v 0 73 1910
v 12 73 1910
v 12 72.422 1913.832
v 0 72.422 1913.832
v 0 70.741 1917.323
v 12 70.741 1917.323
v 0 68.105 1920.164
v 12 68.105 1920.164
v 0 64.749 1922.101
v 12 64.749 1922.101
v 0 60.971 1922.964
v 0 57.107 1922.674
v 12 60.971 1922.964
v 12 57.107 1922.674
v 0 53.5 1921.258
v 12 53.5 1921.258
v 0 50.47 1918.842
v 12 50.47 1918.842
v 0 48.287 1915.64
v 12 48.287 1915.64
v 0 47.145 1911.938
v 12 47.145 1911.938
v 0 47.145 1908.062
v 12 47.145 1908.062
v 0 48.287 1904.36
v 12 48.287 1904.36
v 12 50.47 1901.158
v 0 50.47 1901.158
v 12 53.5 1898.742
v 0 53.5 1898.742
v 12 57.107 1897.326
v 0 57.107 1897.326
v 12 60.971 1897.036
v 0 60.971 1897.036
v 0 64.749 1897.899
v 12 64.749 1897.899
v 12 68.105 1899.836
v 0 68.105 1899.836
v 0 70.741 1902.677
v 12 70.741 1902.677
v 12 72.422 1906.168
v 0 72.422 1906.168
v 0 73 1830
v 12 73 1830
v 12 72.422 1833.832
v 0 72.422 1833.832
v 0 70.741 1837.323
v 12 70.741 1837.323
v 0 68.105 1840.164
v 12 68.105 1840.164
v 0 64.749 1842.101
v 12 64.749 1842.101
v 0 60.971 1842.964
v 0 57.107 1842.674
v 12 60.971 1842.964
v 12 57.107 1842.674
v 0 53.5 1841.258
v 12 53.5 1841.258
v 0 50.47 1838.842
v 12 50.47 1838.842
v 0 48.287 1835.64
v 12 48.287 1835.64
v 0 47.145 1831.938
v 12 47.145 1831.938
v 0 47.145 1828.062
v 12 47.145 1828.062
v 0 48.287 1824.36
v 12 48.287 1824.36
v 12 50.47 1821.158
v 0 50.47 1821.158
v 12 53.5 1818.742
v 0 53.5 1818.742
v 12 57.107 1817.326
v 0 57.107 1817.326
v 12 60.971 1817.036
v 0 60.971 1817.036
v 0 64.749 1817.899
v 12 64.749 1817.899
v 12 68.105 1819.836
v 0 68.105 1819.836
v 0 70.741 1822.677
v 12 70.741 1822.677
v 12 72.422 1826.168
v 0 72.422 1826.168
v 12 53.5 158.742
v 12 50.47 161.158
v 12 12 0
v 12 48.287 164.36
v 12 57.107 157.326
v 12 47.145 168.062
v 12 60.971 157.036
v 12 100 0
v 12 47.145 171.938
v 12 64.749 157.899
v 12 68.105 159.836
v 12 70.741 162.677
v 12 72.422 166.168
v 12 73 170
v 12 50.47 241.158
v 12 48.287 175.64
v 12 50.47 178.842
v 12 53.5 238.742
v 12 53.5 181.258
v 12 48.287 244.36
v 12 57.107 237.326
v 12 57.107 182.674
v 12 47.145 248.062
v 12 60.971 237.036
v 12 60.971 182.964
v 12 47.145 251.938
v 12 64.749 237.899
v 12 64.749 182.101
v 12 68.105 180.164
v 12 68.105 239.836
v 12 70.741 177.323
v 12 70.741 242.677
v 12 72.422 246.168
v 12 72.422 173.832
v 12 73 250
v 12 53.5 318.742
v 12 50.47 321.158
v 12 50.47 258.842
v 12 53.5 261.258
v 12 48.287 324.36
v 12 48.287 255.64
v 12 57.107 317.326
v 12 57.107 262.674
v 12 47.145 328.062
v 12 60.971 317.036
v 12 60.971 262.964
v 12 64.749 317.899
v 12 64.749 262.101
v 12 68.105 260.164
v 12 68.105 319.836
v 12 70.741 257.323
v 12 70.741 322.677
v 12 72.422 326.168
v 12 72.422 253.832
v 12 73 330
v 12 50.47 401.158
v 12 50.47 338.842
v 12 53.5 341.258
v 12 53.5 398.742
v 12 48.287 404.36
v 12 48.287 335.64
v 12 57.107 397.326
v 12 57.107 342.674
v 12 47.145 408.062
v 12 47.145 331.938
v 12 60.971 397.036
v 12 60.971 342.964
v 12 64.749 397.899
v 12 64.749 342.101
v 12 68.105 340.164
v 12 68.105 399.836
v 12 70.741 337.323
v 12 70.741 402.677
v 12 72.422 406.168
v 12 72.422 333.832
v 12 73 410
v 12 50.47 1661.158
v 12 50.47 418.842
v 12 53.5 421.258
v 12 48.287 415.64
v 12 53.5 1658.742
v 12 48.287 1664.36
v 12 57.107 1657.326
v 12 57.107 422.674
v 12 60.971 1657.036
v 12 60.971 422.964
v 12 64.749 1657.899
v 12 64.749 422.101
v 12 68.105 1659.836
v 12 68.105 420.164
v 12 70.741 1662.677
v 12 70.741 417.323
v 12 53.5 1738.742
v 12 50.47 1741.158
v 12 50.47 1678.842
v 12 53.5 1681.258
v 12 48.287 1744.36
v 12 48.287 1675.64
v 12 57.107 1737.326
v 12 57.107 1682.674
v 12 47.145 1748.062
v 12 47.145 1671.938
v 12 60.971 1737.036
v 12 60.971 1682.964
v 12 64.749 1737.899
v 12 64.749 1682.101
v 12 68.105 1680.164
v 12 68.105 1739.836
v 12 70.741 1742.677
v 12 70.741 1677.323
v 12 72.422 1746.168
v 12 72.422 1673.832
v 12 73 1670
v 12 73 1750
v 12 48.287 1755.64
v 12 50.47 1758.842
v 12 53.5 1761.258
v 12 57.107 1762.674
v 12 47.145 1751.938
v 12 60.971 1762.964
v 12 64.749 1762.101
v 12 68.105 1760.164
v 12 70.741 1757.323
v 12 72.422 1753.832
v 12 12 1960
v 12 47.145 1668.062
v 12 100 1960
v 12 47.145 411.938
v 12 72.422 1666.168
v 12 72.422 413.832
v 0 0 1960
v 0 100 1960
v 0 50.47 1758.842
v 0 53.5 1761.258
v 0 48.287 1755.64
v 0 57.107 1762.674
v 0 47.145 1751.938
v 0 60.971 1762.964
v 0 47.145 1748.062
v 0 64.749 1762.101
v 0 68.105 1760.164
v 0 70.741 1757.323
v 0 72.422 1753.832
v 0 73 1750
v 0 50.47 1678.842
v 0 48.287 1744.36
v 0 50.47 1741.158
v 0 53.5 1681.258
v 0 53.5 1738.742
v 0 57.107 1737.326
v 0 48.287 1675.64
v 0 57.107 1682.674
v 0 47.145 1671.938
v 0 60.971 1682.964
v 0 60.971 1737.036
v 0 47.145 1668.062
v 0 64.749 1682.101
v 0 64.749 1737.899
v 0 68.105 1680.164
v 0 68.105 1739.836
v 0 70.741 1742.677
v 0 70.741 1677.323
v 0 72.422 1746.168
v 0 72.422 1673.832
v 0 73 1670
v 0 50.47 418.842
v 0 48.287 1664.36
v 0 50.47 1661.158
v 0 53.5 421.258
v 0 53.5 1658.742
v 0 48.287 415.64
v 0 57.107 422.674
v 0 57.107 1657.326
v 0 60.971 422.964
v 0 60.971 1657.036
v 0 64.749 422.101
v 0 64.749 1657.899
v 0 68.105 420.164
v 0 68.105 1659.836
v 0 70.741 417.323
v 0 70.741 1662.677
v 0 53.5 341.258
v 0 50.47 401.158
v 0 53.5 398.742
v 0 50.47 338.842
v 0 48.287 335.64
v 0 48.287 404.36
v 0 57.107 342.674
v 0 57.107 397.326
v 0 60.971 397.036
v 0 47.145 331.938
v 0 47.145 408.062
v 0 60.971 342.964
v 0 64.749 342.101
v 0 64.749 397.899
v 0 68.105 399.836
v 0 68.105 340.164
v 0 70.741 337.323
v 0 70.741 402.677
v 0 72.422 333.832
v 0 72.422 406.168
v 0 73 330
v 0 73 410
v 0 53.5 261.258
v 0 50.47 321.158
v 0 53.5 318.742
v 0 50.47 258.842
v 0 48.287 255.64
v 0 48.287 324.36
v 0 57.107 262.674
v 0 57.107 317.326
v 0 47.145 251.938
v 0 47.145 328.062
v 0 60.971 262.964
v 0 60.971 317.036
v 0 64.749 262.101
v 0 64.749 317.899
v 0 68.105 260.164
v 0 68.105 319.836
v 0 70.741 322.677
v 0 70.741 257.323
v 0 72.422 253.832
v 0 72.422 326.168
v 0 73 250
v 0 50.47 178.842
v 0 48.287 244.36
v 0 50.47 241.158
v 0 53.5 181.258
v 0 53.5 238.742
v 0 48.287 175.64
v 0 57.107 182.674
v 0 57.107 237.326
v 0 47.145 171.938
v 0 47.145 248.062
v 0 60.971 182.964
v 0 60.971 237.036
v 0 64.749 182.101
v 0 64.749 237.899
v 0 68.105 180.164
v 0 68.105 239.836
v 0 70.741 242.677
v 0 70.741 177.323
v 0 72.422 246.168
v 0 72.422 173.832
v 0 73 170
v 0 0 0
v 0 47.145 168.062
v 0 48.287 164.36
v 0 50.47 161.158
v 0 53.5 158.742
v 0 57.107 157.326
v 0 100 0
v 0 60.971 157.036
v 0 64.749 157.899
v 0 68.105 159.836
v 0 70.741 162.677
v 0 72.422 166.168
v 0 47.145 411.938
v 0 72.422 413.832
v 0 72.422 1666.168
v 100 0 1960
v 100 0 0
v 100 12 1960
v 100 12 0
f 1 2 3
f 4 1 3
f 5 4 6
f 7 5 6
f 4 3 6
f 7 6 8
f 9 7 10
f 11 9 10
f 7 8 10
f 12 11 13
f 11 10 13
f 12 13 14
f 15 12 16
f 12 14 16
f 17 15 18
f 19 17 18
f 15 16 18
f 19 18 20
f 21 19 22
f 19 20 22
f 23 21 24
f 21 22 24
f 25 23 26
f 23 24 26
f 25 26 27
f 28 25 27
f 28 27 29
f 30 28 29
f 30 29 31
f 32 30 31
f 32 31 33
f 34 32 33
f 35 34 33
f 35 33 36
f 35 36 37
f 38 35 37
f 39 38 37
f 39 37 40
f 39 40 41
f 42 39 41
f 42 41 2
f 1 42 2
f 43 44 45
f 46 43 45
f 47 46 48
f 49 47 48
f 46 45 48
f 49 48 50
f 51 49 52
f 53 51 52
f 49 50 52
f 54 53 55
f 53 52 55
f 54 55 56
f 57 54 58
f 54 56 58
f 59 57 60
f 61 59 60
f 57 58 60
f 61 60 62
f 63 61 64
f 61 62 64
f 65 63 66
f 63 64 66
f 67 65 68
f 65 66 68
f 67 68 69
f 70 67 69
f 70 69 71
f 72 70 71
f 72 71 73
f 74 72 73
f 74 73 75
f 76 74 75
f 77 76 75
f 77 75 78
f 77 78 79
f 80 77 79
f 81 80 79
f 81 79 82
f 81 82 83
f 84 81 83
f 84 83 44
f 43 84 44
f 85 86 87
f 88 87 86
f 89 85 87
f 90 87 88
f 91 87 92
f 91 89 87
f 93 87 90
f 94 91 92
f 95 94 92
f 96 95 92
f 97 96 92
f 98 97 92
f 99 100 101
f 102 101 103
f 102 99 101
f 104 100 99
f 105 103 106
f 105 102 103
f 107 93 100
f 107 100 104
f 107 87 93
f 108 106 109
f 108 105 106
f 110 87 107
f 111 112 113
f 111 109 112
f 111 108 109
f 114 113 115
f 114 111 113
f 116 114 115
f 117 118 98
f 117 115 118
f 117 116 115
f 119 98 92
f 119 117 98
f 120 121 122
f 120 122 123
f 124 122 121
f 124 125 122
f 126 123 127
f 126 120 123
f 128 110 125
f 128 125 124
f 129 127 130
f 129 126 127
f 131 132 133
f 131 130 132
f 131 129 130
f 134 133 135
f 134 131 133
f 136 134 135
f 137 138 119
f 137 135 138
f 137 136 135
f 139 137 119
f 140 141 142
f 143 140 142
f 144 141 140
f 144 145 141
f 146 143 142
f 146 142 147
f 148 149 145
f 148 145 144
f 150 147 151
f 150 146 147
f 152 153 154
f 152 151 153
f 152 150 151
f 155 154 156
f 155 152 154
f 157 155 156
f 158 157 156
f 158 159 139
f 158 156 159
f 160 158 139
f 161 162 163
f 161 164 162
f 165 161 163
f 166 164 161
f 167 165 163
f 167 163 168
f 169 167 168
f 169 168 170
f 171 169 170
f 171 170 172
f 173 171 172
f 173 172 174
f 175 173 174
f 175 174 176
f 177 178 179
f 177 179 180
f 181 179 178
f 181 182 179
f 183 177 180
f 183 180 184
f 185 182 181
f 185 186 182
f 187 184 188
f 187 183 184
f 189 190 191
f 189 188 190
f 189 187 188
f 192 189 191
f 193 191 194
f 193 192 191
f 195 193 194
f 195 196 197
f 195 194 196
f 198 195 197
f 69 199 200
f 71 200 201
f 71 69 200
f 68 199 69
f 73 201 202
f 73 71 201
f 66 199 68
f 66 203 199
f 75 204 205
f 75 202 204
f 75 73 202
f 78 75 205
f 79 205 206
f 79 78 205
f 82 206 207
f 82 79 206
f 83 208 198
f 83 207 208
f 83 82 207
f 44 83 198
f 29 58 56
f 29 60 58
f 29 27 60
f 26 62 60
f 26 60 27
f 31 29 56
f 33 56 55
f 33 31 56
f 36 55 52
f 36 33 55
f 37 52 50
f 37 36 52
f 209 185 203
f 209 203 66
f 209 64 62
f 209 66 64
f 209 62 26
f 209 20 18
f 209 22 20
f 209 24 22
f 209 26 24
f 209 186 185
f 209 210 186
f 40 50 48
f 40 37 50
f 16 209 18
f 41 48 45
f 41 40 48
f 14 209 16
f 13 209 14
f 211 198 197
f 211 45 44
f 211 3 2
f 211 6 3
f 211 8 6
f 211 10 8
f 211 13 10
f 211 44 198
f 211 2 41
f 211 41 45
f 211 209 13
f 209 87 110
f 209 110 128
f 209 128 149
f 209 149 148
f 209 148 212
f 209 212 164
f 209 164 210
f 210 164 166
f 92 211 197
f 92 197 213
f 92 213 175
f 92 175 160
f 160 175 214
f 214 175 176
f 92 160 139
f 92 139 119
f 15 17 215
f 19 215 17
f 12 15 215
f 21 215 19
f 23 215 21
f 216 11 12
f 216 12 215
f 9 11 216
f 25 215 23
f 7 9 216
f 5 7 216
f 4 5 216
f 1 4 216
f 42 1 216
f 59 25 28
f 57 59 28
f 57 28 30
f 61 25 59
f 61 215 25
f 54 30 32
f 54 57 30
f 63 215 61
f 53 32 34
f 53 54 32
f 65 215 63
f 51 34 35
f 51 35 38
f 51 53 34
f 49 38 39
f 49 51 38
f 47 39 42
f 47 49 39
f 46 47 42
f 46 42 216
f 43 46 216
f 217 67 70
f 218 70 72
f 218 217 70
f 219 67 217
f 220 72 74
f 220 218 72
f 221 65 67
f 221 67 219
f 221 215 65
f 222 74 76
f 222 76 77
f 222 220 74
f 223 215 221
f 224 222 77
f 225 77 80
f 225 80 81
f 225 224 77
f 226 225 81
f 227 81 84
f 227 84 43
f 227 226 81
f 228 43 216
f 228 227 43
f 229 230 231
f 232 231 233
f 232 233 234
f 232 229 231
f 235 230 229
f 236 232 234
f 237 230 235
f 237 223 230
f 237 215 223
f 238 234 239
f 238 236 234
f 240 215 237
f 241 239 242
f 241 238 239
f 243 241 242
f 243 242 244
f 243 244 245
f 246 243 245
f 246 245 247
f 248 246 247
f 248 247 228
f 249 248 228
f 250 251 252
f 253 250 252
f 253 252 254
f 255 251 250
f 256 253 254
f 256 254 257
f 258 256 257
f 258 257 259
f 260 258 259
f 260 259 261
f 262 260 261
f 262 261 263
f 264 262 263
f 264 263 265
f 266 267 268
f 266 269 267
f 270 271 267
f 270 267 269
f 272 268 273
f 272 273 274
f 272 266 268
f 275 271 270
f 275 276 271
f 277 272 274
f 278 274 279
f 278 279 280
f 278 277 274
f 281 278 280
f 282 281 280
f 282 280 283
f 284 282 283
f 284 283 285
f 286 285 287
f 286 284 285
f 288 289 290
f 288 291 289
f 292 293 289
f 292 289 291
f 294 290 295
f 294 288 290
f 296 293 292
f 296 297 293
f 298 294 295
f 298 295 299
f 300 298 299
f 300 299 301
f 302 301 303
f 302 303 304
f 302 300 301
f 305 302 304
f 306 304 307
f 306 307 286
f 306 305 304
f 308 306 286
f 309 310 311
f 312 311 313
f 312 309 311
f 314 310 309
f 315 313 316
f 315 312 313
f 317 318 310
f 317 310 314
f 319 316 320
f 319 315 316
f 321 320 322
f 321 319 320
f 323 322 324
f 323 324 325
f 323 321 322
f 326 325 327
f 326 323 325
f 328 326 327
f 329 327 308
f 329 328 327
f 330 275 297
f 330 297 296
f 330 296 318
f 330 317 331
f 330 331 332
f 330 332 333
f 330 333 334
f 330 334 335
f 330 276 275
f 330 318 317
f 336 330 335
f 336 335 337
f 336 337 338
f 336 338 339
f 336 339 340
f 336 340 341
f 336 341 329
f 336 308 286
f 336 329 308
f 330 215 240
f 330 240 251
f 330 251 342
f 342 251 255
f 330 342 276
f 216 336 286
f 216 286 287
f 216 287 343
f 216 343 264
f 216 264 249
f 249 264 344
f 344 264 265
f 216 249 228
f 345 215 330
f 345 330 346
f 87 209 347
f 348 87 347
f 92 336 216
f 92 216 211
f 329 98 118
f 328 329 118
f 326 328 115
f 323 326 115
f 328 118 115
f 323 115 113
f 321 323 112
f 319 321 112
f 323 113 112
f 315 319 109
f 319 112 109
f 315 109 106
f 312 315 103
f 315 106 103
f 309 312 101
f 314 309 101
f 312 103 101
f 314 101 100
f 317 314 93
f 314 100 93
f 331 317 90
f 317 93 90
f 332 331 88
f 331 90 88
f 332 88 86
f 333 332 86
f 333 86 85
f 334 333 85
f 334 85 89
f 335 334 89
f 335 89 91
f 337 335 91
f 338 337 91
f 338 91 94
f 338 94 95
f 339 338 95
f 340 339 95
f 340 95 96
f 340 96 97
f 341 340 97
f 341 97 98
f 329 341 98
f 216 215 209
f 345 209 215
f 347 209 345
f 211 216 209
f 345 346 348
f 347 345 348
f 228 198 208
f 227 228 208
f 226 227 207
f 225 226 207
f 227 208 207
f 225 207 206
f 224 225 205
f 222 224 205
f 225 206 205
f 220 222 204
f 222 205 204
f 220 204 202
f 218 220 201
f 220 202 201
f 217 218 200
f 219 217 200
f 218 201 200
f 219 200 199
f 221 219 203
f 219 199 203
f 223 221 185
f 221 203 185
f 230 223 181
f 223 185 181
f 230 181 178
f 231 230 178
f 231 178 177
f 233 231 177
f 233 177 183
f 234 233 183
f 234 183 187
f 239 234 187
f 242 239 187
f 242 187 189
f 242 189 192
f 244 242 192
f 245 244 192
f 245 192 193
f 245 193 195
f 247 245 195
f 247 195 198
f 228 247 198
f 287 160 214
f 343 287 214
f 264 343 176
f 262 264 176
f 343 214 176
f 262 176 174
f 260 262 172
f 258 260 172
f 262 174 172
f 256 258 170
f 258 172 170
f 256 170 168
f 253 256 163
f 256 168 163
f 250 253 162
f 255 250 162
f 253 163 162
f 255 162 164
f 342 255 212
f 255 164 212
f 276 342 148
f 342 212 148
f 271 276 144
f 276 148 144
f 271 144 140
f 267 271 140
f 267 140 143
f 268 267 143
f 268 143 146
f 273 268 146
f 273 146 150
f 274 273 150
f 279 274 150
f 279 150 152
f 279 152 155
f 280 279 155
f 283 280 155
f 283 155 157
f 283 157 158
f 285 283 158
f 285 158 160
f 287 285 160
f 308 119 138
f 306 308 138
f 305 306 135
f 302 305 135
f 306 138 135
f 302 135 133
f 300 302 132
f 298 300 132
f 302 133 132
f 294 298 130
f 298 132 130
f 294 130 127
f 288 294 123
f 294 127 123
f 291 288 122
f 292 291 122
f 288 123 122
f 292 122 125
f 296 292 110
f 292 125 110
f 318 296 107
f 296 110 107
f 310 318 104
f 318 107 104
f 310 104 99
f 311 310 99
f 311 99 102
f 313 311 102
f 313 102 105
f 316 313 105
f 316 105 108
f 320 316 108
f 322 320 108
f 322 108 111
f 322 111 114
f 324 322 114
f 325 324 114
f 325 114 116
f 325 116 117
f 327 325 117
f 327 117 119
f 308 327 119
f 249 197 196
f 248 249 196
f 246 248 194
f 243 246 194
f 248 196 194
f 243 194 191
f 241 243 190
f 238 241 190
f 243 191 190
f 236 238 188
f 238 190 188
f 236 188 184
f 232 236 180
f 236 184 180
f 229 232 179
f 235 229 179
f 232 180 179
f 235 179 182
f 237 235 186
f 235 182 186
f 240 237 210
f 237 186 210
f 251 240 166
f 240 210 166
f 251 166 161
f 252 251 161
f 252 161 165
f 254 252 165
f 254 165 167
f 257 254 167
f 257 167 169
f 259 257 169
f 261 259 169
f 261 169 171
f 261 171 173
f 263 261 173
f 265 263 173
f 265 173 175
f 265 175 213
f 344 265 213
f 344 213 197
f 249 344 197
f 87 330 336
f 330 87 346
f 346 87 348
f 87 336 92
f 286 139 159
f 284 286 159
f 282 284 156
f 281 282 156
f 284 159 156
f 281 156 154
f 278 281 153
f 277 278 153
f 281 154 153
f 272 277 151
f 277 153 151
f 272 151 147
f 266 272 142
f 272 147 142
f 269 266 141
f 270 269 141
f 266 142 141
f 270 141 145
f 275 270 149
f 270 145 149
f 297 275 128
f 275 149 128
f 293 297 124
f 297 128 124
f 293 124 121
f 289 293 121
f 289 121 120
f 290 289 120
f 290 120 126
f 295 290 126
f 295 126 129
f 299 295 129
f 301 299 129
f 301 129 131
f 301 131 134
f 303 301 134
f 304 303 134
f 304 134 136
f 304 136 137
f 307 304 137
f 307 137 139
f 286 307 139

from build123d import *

# Parameters (mm, degrees)
SKETCH_1_W             = 100
SKETCH_1_H             = 100
EXTRUDE_1_DEPTH        = 1960
SKETCH_2_W             = 88
SKETCH_2_H             = 88
CUT_EXTRUDE_1_DEPTH    = 1966.095417531
SKETCH_3_R             = 13
CUT_EXTRUDE_2_DEPTH    = 1965.521315741
PATTERN_LINEAR_1_COUNT = 4
PATTERN_LINEAR_1_PITCH = 80
SKETCH_4_R             = 13
CUT_EXTRUDE_3_DEPTH    = 1965.521315741
PATTERN_LINEAR_2_COUNT = 4
PATTERN_LINEAR_2_PITCH = 80


with BuildPart() as part:
    # 草图1 → 凸台-拉伸1 (new body)
    with BuildSketch(Plane.XY):
        with Locations((50, 50)):
            Rectangle(SKETCH_1_W, SKETCH_1_H)
    extrude(amount=EXTRUDE_1_DEPTH)

    # 草图2 → 切除-拉伸1 (cut, through all)
    with BuildSketch(Plane.XY.offset(1960)):
        with Locations((56, 56)):
            Rectangle(SKETCH_2_W, SKETCH_2_H)
    extrude(amount=-CUT_EXTRUDE_1_DEPTH, mode=Mode.SUBTRACT)

    # 草图3 → 切除-拉伸2 (cut, through all)
    with BuildSketch(Plane(origin=(12, 0, 0), x_dir=(0, 0, -1), z_dir=(1, 0, 0))):
        with Locations(Location((-1910, 60, 0), (0, 0, 90))):
            Circle(SKETCH_3_R)
    cut_extrude_2 = extrude(amount=-CUT_EXTRUDE_2_DEPTH, mode=Mode.SUBTRACT)

    # 阵列(线性)1: 切除-拉伸2 ×4
    with Locations(*[(0, 0, -i * PATTERN_LINEAR_1_PITCH) for i in range(1, PATTERN_LINEAR_1_COUNT)]):
        add(cut_extrude_2, mode=Mode.SUBTRACT)

    # 草图4 → 切除-拉伸3 (cut, through all)
    with BuildSketch(Plane(origin=(12, 0, 0), x_dir=(0, 0, -1), z_dir=(1, 0, 0))):
        with Locations(Location((-170, 60, 0), (0, 0, 90))):
            Circle(SKETCH_4_R)
    cut_extrude_3 = extrude(amount=-CUT_EXTRUDE_3_DEPTH, mode=Mode.SUBTRACT)

    # 阵列(线性)2: 切除-拉伸3 ×4
    with Locations(*[(0, 0, i * PATTERN_LINEAR_2_PITCH) for i in range(1, PATTERN_LINEAR_2_COUNT)]):
        add(cut_extrude_3, mode=Mode.SUBTRACT)


solid = part.part
